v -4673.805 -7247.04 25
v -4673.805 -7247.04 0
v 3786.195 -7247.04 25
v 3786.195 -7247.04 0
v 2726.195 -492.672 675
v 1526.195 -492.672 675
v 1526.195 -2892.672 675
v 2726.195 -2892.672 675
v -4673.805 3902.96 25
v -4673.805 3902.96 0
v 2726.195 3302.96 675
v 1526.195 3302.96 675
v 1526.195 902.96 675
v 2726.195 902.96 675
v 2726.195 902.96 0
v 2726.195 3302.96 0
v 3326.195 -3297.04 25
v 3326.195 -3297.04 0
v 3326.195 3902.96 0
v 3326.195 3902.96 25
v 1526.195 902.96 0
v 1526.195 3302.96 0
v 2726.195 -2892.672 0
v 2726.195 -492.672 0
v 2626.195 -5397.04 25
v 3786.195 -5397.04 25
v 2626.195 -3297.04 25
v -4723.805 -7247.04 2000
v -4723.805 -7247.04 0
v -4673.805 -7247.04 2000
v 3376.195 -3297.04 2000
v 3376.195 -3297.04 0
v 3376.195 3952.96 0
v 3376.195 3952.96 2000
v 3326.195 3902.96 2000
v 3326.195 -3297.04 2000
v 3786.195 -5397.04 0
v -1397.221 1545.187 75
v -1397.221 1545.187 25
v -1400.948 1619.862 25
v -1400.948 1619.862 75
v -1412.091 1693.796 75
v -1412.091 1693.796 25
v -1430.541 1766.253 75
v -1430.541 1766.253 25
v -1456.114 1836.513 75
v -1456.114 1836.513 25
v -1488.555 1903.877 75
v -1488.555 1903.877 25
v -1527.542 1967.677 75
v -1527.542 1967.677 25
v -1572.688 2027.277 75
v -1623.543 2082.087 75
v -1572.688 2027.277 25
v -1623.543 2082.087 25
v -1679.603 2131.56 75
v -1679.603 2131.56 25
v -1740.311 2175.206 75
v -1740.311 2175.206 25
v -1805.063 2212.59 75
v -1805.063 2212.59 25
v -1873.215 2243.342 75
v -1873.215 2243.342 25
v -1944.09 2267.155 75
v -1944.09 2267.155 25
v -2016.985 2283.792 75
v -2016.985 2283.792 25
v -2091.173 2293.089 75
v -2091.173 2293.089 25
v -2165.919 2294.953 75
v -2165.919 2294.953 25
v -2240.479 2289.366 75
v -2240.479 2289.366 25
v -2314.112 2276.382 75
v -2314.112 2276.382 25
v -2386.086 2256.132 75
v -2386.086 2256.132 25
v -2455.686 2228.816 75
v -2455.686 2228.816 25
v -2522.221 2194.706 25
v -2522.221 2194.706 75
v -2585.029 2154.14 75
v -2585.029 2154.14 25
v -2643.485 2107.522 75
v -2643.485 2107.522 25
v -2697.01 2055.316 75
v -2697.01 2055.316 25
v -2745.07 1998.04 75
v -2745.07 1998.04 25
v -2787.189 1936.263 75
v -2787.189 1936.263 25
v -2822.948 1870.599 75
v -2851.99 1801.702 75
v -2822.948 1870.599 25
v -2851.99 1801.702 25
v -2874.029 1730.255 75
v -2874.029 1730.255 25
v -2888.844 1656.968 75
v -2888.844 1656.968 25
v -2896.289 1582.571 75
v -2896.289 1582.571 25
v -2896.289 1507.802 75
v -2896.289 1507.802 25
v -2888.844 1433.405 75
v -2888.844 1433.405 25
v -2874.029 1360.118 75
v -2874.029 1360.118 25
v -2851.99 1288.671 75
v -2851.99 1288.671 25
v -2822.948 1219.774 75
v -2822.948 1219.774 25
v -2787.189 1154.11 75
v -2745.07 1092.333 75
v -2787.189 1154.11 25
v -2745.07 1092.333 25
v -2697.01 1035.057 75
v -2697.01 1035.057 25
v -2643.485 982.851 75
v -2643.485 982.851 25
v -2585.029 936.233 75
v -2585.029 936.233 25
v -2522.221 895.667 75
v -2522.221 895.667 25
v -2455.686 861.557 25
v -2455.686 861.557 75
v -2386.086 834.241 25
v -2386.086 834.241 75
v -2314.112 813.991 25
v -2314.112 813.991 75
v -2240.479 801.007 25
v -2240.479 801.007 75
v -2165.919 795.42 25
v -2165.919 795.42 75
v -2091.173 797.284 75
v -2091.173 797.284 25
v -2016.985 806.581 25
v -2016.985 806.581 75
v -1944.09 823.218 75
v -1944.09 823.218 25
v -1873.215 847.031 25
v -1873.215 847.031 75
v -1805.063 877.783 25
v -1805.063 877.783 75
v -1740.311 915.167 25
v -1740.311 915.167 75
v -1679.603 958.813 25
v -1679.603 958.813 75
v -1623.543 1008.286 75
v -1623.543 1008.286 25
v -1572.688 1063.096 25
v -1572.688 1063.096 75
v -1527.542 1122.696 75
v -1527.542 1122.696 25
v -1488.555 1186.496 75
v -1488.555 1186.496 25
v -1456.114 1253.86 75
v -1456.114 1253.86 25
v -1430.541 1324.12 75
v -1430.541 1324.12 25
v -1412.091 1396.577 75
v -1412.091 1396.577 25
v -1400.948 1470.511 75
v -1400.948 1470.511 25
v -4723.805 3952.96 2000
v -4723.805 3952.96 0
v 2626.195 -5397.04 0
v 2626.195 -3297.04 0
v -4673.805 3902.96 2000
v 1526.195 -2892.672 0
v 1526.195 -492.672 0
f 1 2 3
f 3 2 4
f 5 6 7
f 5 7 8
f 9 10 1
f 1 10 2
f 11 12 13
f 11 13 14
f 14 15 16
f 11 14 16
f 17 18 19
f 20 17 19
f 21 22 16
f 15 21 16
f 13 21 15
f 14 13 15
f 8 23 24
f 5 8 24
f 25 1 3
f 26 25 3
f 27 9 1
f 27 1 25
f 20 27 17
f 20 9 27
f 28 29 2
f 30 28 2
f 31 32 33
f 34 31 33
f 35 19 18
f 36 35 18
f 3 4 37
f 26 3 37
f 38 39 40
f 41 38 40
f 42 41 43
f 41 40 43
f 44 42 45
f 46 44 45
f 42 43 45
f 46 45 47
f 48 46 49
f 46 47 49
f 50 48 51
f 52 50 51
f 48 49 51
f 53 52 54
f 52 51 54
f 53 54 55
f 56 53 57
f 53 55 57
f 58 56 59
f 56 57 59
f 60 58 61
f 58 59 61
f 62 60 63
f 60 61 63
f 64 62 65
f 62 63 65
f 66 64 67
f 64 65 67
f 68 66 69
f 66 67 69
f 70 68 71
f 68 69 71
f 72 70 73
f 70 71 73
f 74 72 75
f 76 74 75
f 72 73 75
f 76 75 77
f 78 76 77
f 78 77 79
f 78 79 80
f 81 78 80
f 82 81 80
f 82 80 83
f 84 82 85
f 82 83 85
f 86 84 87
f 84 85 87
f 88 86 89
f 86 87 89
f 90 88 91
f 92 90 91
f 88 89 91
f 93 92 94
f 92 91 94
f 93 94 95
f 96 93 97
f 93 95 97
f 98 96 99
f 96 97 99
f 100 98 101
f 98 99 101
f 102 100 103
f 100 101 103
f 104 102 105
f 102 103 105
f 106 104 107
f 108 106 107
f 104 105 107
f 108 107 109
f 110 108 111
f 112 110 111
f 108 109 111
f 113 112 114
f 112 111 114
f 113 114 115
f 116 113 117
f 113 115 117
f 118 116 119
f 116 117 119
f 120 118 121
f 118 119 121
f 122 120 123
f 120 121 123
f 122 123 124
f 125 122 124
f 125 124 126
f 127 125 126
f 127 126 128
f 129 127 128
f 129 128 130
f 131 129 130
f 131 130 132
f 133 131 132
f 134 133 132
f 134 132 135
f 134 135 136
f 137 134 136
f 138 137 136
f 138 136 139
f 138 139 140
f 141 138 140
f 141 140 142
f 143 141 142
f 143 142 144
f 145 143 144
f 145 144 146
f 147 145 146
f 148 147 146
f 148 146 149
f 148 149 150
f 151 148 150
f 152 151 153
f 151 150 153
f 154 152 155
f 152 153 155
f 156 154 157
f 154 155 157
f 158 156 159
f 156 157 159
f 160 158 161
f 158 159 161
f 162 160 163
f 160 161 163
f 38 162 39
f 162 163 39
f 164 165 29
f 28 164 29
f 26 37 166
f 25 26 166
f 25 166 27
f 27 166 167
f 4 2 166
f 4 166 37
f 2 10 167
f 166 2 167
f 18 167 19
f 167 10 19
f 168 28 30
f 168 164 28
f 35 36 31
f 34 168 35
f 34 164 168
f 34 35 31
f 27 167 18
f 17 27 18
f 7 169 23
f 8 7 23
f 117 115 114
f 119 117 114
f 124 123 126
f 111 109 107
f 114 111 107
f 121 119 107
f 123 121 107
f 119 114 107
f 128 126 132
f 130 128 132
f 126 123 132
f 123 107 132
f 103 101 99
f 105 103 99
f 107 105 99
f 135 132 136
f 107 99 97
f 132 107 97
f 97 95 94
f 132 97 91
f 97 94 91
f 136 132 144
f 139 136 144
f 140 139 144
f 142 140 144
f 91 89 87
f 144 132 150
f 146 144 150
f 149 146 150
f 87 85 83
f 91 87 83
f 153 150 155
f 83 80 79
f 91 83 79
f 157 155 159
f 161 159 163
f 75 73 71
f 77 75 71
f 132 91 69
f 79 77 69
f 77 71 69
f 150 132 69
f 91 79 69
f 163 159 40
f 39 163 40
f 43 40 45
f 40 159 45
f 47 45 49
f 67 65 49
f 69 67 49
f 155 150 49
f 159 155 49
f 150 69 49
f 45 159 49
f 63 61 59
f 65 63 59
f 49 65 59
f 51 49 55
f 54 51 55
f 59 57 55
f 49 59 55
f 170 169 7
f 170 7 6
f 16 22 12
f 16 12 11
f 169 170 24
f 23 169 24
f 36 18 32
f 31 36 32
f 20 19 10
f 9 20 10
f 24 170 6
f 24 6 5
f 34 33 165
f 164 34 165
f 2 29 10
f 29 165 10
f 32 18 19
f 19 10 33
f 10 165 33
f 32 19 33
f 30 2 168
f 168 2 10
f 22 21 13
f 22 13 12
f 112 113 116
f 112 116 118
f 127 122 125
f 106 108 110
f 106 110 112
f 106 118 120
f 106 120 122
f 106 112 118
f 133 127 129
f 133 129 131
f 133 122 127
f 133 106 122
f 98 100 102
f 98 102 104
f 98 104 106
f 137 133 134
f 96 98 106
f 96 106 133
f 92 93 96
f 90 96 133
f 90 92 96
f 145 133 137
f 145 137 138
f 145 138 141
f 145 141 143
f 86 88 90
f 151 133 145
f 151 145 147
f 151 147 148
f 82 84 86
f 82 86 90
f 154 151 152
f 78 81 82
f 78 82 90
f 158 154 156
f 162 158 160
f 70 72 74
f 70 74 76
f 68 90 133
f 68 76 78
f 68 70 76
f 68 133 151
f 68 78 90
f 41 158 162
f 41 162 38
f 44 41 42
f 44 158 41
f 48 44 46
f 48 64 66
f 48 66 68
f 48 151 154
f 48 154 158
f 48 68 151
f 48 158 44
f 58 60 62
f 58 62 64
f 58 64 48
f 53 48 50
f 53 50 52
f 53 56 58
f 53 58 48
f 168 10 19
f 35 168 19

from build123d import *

# Parameters (mm, degrees)
F0_W     = 1200
F0_H     = 2400
F1_DEPTH = 25
F2_DEPTH = 675
F3_DEPTH = 2000
F4_R     = 750
F5_DEPTH = 50


with BuildPart() as f1:
    # F0 (on Top) → F1 (new body)
    with BuildSketch(Plane.XY):
        Polygon((-4673.8049507141, -7247.0402780964), (3786.1950492859, -7247.0402780964), (3786.1950492859, -5397.0402780964), (2626.1950492859, -5397.0402780964), (2626.1950492859, -3297.0402780964), (3326.1950492859, -3297.0402780964), (3326.1950492859, 3902.9597219036), (-4673.8049507141, 3902.9597219036), align=None)
        with Locations((2126.1950492859, -1692.671585083)):
            Rectangle(F0_W, F0_H, mode=Mode.SUBTRACT)
        with Locations((2126.1950492859, 2102.9597219036)):
            Rectangle(F0_W, F0_H, mode=Mode.SUBTRACT)
        with Locations((2126.1950492859, -1692.671585083)):
            Rectangle(F0_W, F0_H)
        with Locations((2126.1950492859, 2102.9597219036)):
            Rectangle(F0_W, F0_H)
    extrude(amount=F1_DEPTH)


with BuildPart() as f2:
    # F0 (on Top) → F2 (new body)
    with BuildSketch(Plane.XY):
        with Locations((2126.1950492859, 2102.9597219036)):
            Rectangle(F0_W, F0_H)
    extrude(amount=F2_DEPTH)


with BuildPart() as f2b:
    # F0 (on Top) → F2, piece 2 (new body)
    with BuildSketch(Plane.XY):
        with Locations((2126.1950492859, -1692.671585083)):
            Rectangle(F0_W, F0_H)
    extrude(amount=F2_DEPTH)


with BuildPart() as f3:
    # F0 (on Top) → F3 (new body)
    with BuildSketch(Plane.XY):
        Polygon((-4723.8049507141, -7247.0402780964), (-4673.8049507141, -7247.0402780964), (-4673.8049507141, 3902.9597219036), (3326.1950492859, 3902.9597219036), (3326.1950492859, -3297.0402780964), (3376.1950492859, -3297.0402780964), (3376.1950492859, 3952.9597219036), (-4723.8049507141, 3952.9597219036), align=None)
    extrude(amount=F3_DEPTH)


with BuildPart() as f5:
    # F4 (on face) → F5 (new body)
    with BuildSketch(Plane.XY.offset(25)):
        with Locations((-2147.2208499908, 1545.1865196228)):
            Circle(F4_R)
    extrude(amount=F5_DEPTH)


solid = Compound([f1.part, f2.part, f2b.part, f3.part, f5.part])
